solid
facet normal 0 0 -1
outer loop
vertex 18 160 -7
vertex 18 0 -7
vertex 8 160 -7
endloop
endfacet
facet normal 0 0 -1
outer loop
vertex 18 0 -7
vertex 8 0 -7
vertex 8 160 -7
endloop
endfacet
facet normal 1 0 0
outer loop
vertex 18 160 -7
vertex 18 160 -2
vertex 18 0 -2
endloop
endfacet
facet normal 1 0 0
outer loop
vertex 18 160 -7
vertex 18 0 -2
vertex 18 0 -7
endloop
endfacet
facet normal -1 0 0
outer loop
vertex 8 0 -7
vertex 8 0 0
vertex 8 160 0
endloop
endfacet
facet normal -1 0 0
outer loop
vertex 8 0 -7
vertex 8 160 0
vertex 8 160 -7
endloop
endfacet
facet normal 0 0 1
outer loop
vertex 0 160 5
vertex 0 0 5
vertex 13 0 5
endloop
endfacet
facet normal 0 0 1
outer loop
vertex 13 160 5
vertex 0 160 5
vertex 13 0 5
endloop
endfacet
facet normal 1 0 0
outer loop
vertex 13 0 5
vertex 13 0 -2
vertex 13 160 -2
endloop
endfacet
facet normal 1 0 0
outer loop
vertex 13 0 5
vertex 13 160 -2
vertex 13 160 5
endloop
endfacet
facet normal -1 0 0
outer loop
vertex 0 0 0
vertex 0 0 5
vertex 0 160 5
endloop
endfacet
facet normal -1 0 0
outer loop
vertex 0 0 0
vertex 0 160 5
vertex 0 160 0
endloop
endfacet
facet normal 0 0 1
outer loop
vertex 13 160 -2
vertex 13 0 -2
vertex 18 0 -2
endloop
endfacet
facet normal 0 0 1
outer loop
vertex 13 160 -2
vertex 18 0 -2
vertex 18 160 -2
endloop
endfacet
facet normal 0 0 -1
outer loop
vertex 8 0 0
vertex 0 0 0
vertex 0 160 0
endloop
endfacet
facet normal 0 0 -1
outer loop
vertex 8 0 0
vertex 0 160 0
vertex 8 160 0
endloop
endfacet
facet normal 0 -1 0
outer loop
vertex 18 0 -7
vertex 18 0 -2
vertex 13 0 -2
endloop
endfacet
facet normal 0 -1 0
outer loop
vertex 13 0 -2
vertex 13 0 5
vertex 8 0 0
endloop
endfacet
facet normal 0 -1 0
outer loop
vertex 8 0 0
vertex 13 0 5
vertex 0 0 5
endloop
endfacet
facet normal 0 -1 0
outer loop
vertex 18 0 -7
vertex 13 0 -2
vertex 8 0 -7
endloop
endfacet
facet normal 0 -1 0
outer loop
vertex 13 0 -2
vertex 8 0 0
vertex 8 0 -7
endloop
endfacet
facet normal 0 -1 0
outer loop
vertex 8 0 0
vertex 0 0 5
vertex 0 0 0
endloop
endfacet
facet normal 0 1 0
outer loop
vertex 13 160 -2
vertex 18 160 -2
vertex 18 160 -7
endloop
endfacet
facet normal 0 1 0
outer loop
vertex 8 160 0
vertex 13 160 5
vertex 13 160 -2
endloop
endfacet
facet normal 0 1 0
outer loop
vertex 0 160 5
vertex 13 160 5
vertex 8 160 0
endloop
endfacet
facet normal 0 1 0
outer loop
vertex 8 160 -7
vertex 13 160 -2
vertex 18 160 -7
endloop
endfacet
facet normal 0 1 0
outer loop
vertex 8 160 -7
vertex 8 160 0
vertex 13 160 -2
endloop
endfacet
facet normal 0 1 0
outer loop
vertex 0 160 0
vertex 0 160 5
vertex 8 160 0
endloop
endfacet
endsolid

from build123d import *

# Parameters (mm, degrees)
BOSS_EXTRUDE1_DEPTH = 160
SKETCH2_W           = 5
SKETCH2_H           = 160
BOSS_EXTRUDE2_DEPTH = 5


with BuildPart() as part:
    # Sketch1 → Boss-Extrude1 (new body)
    with BuildSketch(Plane(origin=(0, 0, 0), x_dir=(1, 0, 0), z_dir=(0, 1, 0))):
        Polygon((0, 0), (8, 0), (8, 7), (13, 7), (13, -5), (8, -5), (0, -5), align=None)
    extrude(amount=BOSS_EXTRUDE1_DEPTH)

    # Sketch2 → Boss-Extrude2 (add)
    with BuildSketch(Plane(origin=(13, 0, 0), x_dir=(0, 0, -1), z_dir=(1, 0, 0))):
        with Locations((4.5, 80)):
            Rectangle(SKETCH2_W, SKETCH2_H)
    extrude(amount=BOSS_EXTRUDE2_DEPTH)


solid = part.part
